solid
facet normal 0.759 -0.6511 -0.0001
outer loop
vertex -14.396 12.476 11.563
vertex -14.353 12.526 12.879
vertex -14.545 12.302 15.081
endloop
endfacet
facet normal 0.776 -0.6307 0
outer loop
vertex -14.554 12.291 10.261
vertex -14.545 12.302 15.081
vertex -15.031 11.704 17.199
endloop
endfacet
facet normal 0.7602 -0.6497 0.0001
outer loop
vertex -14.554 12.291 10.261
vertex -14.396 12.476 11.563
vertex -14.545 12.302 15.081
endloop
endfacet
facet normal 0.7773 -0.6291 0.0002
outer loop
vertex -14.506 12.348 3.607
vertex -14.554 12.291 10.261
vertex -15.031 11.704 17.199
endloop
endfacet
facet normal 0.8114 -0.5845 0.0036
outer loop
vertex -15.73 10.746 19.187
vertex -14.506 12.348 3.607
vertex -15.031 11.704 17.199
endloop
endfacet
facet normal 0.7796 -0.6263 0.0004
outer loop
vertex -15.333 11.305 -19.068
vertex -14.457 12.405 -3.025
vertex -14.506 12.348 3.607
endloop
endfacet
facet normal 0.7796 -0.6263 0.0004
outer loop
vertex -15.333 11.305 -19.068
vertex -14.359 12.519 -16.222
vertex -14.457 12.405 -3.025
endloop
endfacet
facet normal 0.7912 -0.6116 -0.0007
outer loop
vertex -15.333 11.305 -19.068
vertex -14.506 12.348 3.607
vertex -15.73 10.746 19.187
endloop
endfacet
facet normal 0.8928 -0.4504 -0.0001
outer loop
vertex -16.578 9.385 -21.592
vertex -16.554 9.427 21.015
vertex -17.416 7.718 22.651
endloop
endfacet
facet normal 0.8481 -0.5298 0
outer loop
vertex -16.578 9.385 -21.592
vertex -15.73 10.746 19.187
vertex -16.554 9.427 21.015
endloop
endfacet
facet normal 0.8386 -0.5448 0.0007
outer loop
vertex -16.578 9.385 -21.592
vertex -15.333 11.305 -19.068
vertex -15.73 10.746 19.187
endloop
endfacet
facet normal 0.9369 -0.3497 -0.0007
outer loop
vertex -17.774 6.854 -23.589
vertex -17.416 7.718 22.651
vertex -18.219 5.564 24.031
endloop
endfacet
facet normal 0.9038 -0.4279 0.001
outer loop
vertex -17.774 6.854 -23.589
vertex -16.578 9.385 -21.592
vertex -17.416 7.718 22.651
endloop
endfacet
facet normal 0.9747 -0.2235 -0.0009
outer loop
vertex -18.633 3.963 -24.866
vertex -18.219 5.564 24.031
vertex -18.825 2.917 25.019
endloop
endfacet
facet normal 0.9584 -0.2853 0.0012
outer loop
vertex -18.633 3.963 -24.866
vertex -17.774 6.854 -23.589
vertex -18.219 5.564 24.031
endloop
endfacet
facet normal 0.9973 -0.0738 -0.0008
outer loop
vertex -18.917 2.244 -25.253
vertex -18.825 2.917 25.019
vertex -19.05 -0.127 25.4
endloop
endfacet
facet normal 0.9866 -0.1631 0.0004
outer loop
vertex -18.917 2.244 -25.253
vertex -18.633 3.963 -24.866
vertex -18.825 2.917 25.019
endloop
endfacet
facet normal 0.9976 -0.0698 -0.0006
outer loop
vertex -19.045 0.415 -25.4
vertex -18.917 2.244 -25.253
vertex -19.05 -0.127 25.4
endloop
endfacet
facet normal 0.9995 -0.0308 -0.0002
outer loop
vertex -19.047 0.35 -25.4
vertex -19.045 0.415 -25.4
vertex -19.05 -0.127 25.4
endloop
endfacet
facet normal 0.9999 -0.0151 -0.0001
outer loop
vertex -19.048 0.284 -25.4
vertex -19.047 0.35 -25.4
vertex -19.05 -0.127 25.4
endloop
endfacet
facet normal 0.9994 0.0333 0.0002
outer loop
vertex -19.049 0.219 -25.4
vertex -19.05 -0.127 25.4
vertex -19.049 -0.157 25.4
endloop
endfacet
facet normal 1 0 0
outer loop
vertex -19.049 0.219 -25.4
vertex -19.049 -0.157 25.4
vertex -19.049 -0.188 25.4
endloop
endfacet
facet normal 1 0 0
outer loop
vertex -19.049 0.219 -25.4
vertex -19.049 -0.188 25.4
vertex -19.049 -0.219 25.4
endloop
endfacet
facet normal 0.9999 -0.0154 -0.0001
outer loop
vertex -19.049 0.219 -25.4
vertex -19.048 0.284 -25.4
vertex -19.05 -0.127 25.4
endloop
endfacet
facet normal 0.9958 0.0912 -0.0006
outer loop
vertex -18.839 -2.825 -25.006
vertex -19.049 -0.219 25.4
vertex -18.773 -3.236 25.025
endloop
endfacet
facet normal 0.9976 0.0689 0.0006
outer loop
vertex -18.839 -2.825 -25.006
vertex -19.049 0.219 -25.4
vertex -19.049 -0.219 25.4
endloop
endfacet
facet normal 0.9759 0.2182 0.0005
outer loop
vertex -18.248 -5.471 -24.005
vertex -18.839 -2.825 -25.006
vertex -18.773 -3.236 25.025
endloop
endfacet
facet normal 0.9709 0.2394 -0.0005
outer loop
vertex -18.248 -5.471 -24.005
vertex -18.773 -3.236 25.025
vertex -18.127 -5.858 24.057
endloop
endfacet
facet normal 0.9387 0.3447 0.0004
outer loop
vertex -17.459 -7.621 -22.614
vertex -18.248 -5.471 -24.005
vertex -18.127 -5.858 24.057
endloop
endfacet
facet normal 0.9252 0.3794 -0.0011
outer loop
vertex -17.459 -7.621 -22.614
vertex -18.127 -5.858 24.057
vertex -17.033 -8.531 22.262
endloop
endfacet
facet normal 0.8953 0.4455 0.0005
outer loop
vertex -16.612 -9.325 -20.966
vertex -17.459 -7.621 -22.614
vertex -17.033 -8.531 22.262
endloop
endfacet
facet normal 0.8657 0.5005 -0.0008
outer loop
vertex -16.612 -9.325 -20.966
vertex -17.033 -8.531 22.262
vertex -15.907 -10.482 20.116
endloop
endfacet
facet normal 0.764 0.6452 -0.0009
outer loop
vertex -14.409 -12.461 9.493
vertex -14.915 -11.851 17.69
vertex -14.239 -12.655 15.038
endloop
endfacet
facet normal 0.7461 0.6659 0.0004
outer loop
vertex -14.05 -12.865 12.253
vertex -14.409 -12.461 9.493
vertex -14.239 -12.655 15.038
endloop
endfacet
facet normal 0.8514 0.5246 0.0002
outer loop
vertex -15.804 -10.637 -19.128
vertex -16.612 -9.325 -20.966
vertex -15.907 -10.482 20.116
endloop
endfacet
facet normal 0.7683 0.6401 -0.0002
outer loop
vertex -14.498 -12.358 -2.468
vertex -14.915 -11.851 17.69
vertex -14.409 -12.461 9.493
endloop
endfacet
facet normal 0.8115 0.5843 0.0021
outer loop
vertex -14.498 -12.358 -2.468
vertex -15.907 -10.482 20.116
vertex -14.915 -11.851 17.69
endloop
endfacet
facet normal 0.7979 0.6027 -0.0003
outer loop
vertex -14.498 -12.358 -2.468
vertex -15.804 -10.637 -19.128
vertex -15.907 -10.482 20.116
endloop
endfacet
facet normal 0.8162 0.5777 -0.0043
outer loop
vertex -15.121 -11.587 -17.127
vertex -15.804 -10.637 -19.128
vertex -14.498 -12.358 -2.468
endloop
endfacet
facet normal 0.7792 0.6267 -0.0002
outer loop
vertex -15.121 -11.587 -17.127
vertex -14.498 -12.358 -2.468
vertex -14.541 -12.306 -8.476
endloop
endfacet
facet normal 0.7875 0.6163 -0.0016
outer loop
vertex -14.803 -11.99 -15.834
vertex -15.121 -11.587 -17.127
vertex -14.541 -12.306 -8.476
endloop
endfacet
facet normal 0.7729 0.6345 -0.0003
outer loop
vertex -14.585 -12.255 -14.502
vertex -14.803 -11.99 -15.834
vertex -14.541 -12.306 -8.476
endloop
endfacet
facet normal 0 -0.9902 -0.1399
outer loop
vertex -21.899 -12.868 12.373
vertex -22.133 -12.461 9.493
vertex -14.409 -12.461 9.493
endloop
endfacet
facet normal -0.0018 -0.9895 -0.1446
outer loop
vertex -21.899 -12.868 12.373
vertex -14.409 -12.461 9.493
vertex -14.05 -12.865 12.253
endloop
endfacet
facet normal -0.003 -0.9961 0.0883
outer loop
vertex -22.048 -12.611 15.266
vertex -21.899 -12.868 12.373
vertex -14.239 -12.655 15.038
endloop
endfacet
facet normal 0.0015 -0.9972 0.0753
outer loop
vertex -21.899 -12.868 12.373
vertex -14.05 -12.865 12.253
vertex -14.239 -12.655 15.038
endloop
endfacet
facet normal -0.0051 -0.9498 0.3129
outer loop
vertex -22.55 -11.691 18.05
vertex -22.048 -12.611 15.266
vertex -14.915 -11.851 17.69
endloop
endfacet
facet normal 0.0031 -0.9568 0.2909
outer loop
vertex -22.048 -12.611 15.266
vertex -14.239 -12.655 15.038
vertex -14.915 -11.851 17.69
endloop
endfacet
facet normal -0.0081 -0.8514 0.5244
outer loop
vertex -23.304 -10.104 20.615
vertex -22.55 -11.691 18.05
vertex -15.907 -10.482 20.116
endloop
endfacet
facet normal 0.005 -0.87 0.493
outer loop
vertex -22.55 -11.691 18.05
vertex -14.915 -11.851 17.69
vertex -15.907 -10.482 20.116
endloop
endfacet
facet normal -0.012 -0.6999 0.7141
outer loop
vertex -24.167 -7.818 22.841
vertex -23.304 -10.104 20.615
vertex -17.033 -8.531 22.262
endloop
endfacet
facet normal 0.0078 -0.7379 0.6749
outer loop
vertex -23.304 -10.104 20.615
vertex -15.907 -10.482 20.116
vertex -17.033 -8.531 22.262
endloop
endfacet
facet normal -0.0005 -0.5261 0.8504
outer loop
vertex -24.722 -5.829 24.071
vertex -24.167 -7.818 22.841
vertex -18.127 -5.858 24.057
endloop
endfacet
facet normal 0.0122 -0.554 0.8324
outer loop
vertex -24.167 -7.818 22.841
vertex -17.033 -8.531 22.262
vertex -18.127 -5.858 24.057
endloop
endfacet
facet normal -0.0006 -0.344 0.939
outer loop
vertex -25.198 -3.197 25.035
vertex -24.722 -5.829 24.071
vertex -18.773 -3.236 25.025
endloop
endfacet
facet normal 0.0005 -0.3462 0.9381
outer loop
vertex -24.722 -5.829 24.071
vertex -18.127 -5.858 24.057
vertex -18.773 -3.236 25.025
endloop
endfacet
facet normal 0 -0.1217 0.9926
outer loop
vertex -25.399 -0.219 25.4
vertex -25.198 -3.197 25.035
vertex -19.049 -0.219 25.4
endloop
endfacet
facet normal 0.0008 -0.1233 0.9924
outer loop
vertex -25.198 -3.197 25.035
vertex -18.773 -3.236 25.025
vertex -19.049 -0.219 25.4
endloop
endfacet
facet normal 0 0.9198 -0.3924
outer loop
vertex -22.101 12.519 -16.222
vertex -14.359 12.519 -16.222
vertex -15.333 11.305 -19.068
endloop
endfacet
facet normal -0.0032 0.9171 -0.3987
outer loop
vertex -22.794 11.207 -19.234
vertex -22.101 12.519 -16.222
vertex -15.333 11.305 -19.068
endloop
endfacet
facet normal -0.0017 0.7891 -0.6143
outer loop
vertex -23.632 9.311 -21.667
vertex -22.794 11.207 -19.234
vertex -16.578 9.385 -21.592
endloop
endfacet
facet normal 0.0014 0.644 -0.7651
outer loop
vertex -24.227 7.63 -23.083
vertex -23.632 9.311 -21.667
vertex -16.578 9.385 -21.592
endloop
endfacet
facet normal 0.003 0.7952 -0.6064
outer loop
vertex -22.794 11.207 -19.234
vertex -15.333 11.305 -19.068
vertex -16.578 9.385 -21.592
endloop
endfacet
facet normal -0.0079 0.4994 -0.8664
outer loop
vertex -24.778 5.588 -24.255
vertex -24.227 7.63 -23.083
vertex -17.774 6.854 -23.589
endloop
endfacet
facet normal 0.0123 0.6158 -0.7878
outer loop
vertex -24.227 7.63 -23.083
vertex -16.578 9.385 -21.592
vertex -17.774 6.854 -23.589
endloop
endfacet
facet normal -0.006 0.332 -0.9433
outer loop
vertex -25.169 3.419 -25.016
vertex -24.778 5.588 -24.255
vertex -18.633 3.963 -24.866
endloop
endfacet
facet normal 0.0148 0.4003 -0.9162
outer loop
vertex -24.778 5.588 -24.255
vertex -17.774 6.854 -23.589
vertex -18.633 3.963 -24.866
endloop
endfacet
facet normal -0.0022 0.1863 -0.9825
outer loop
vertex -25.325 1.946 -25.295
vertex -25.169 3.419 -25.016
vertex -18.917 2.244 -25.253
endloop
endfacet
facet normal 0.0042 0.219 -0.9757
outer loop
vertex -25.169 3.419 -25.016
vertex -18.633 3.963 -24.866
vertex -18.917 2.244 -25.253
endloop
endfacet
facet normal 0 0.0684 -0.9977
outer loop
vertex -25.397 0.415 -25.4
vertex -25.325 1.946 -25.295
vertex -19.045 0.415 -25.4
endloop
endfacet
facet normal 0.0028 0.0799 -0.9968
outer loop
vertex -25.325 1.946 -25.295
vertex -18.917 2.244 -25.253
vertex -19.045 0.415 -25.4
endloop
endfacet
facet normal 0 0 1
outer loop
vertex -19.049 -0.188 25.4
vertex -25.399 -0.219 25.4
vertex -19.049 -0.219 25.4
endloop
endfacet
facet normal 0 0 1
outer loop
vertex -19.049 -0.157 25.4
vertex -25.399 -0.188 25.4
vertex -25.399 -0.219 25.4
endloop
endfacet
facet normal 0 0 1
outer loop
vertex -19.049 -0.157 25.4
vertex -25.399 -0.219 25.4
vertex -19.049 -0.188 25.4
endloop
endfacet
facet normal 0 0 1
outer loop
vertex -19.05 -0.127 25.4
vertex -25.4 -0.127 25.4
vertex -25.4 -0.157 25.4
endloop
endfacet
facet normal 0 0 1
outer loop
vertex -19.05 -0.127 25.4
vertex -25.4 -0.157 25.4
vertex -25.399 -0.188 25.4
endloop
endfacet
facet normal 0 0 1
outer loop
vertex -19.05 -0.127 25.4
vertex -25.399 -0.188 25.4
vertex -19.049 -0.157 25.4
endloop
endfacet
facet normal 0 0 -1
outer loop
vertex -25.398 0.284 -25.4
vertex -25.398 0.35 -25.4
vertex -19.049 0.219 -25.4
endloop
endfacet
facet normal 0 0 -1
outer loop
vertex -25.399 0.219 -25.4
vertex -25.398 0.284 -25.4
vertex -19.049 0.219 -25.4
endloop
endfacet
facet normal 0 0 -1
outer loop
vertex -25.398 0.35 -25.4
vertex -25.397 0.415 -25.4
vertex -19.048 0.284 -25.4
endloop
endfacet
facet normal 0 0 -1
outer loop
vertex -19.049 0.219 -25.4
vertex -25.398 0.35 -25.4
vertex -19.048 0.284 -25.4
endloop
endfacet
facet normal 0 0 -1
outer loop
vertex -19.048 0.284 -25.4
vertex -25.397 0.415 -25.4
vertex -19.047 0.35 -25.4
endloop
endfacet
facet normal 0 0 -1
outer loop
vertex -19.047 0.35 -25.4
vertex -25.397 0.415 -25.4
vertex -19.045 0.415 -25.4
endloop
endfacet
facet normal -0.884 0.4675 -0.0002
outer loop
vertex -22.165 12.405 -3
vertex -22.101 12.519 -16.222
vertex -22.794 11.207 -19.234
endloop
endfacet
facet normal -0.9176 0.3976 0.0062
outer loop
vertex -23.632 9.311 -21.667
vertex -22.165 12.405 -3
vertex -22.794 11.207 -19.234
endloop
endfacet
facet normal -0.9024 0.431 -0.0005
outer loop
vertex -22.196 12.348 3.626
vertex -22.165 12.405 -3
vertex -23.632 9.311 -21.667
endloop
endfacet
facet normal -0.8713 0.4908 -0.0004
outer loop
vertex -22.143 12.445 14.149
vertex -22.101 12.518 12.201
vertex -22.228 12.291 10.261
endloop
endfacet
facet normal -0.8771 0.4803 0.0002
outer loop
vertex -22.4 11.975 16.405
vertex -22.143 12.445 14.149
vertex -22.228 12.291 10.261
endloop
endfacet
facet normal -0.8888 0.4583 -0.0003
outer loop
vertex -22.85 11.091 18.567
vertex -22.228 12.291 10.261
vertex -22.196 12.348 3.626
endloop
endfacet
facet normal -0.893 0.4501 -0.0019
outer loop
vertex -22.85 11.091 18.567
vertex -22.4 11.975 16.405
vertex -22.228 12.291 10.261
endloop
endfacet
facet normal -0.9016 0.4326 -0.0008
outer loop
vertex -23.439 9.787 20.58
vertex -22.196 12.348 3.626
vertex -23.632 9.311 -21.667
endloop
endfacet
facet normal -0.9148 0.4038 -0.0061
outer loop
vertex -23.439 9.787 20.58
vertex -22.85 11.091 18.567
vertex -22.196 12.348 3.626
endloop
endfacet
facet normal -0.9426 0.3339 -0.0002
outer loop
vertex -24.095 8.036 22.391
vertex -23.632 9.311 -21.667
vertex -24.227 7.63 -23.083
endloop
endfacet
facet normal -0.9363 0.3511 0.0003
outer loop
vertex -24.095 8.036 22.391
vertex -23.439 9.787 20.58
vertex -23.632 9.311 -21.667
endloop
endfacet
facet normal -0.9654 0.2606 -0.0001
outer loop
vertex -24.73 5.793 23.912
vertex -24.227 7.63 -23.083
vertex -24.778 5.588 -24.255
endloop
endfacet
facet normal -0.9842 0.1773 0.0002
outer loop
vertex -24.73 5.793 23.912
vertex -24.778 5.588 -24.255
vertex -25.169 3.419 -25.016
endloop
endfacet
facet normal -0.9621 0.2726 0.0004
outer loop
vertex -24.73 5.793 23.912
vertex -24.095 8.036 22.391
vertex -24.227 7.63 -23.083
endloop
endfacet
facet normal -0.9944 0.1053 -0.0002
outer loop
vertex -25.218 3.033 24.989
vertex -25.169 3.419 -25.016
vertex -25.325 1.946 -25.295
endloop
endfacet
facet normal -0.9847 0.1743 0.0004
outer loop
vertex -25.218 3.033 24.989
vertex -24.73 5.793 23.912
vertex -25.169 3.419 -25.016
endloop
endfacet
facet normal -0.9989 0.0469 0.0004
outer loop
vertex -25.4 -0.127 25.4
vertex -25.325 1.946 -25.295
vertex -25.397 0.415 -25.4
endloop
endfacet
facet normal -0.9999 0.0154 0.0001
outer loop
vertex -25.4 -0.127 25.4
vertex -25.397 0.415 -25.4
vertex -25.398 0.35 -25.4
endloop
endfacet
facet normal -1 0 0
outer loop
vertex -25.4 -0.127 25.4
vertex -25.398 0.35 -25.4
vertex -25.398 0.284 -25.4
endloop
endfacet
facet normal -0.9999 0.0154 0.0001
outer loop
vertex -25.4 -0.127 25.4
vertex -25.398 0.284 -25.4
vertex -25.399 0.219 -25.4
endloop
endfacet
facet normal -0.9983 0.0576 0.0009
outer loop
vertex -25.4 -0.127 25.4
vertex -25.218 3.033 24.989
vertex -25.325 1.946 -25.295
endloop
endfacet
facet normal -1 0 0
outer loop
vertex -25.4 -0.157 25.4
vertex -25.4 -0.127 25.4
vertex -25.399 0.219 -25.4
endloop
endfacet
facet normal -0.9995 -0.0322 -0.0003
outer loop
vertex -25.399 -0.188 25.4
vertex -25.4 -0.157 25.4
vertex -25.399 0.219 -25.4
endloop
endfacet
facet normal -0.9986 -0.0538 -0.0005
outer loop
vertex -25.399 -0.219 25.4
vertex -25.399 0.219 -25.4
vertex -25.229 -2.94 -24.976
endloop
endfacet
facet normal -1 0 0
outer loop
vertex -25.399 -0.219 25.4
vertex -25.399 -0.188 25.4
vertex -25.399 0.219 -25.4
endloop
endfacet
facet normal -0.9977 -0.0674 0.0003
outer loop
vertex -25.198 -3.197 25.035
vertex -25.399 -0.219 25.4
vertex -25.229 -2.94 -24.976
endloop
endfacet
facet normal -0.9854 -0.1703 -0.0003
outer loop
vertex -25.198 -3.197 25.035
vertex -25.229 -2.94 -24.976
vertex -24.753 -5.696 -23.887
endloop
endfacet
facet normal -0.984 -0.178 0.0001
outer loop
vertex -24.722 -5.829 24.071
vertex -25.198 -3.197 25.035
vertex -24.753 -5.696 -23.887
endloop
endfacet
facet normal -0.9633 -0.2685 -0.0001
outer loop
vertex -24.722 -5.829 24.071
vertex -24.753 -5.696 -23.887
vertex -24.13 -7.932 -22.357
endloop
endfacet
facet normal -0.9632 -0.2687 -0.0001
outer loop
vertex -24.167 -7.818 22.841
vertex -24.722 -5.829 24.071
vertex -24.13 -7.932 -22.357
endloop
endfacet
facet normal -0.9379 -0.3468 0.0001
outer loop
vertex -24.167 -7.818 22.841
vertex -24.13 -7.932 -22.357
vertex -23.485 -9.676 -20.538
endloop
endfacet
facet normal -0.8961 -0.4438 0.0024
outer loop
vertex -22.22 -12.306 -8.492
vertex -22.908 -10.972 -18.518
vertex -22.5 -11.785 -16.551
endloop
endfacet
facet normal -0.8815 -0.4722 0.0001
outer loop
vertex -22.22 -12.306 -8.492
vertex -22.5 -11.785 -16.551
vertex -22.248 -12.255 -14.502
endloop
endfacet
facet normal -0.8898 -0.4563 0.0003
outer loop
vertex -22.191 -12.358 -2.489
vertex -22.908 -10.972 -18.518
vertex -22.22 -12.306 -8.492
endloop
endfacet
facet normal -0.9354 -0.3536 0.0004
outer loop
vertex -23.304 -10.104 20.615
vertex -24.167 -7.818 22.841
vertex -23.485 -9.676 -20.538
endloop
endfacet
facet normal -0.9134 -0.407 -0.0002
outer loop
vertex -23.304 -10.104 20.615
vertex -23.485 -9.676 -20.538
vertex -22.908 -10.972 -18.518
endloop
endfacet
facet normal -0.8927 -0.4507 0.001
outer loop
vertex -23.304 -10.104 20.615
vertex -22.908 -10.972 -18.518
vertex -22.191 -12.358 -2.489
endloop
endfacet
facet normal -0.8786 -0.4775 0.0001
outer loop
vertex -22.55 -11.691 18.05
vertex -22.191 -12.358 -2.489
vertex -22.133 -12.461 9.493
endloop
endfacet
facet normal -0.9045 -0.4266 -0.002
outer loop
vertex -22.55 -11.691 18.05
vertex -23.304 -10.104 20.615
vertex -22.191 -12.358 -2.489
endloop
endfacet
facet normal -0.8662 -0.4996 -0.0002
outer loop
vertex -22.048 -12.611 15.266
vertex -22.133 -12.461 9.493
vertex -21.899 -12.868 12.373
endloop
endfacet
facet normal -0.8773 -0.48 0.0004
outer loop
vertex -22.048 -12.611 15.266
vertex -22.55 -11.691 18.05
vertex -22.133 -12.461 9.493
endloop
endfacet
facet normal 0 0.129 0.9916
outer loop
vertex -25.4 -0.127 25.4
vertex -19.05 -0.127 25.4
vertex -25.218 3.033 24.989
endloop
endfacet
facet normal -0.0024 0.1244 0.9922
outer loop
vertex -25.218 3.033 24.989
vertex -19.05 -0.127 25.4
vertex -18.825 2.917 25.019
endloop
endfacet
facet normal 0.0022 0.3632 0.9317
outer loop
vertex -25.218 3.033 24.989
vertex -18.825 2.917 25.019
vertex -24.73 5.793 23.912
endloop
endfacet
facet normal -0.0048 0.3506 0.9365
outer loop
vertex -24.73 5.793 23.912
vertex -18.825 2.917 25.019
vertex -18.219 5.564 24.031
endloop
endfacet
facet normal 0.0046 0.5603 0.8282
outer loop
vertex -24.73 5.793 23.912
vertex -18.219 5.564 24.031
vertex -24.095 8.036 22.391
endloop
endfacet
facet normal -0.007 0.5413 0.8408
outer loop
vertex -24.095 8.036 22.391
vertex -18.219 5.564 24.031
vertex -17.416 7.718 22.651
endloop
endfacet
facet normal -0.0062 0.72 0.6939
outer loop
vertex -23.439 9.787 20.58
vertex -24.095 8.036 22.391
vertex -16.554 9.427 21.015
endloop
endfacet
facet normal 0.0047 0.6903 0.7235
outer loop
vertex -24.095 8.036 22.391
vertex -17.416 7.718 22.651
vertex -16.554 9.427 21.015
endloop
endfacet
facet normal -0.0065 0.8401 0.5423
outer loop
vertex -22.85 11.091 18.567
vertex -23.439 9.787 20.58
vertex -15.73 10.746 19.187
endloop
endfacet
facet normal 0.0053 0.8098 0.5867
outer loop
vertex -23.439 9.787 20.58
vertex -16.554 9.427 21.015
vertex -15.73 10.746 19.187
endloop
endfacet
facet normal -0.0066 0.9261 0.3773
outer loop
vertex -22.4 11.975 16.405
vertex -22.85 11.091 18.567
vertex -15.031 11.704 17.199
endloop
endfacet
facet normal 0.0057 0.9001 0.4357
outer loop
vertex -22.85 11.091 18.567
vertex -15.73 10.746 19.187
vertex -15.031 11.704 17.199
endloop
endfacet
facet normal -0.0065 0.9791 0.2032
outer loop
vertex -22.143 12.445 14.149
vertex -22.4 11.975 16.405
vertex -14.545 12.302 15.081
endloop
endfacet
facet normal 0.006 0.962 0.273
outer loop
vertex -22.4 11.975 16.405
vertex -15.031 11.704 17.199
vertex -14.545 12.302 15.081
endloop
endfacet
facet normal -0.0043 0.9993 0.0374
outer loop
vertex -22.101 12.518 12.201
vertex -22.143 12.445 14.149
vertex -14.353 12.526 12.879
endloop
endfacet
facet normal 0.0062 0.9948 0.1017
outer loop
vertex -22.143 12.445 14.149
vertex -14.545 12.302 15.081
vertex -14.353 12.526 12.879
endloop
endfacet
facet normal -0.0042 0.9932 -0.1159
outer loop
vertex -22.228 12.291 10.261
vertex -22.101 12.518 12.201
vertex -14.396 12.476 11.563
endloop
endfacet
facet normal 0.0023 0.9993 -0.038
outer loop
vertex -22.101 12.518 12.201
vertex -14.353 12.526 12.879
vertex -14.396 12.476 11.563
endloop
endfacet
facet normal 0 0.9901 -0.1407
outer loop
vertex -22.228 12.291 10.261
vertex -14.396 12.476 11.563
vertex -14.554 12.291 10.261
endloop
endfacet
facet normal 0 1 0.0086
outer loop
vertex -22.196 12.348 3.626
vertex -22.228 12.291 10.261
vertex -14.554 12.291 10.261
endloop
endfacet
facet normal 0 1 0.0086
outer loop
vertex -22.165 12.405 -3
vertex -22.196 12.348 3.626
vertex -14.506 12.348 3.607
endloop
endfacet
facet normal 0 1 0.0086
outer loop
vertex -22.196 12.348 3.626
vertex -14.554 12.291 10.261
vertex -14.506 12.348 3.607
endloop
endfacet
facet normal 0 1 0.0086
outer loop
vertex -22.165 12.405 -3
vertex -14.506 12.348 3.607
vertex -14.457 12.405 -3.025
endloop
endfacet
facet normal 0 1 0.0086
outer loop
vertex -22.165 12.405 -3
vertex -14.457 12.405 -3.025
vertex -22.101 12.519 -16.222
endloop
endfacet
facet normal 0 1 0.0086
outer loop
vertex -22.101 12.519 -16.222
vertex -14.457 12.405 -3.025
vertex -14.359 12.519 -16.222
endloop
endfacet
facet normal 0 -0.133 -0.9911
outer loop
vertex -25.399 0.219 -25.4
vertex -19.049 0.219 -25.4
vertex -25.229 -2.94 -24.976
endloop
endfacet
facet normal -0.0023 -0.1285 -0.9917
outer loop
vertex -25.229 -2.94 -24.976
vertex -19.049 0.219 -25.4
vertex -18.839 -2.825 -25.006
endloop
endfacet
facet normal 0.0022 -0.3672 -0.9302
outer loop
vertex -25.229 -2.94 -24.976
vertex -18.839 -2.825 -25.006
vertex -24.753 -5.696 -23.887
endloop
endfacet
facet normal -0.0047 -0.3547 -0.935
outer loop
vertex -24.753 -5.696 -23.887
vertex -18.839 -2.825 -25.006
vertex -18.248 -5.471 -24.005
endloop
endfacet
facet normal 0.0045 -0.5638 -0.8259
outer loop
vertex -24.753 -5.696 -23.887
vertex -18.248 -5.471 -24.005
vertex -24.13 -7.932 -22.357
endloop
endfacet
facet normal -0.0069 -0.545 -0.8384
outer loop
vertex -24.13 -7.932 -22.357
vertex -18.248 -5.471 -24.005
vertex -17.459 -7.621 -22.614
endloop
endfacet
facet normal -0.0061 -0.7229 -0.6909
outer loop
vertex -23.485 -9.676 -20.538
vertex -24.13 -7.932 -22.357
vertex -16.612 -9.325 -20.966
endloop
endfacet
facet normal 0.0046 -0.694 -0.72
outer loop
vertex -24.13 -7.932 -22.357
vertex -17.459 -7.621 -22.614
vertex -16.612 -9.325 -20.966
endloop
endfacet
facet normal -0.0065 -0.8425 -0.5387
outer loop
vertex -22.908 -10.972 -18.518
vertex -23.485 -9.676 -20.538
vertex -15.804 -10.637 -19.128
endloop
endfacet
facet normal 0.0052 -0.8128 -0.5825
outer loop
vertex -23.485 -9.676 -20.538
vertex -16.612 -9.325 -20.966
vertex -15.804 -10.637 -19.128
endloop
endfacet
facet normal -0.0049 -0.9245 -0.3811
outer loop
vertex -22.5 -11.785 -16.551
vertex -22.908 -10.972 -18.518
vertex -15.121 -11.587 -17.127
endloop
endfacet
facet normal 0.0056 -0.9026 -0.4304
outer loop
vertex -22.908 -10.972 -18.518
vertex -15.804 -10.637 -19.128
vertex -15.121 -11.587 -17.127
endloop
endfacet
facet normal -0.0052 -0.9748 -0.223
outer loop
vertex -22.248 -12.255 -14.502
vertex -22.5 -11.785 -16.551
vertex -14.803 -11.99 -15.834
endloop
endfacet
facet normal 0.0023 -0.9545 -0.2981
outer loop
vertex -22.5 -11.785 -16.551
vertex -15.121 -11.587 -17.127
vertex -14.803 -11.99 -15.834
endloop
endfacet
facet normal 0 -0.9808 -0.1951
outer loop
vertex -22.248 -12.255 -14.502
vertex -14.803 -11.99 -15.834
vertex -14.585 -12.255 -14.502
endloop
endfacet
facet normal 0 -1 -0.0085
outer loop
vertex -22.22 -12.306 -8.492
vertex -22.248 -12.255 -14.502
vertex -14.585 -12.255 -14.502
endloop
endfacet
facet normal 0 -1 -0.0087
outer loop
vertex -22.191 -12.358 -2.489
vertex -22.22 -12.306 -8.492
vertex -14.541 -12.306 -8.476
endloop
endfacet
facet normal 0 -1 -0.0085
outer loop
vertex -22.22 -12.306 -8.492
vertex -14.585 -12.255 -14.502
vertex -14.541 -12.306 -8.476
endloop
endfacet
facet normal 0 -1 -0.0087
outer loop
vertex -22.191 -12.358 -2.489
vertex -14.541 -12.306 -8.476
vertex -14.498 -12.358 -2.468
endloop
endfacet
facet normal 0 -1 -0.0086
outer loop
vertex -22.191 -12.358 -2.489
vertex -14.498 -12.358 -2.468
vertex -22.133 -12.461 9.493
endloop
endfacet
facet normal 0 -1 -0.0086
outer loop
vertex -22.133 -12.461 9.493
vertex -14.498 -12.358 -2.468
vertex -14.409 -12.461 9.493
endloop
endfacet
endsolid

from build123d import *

# Parameters (mm, degrees)
F0_R     = 25.4
F0_R_2   = 19.05
F1_DEPTH = 25.4
F2_W     = 147.84576
F2_H     = 173.544198
F3_DEPTH = 25.4
F4_W     = 37.611994
F4_H     = 79.151291
F5_DEPTH = 266.7
F6_W     = 42.609616
F6_H     = 73.078748
F7_DEPTH = 25.4


with BuildPart() as f1:
    # F0 (on Top) → F1 (new body, symmetric)
    with BuildSketch(Plane.XY):
        Circle(F0_R)
        Circle(F0_R_2, mode=Mode.SUBTRACT)
    extrude(amount=F1_DEPTH, both=True)

    # F2 (on Right) → F3 (cut)
    with BuildSketch(Plane.YZ):
        with Locations((34.874953, 36.60303)):
            Rectangle(F2_W, F2_H)
        with BuildLine():
            ThreePointArc((-12.461033, 9.493424), (-0.56618, 25.393981), (12.291056, 10.261012))
            Line((12.291056, 10.261012), (12.518928, -16.22196))
            ThreePointArc((12.518928, -16.22196), (-0.562456, -25.369898), (-12.25456, -14.502419))
            Line((-12.25456, -14.502419), (-12.461033, 9.493424))
        make_face(mode=Mode.SUBTRACT)
    extrude(amount=-F3_DEPTH, mode=Mode.SUBTRACT)

    # F4 (on Front) → F5 (cut, symmetric)
    with BuildSketch(Plane.XZ):
        with Locations((15.86056, -0.339897)):
            Rectangle(F4_W, F4_H)
    extrude(amount=F5_DEPTH, both=True, mode=Mode.SUBTRACT)

    # F6 (on Front) → F7 (cut, symmetric)
    with BuildSketch(Plane.XZ):
        with Locations((15.940909, -4.051024)):
            Rectangle(F6_W, F6_H)
    extrude(amount=F7_DEPTH, both=True, mode=Mode.SUBTRACT)


solid = f1.part
